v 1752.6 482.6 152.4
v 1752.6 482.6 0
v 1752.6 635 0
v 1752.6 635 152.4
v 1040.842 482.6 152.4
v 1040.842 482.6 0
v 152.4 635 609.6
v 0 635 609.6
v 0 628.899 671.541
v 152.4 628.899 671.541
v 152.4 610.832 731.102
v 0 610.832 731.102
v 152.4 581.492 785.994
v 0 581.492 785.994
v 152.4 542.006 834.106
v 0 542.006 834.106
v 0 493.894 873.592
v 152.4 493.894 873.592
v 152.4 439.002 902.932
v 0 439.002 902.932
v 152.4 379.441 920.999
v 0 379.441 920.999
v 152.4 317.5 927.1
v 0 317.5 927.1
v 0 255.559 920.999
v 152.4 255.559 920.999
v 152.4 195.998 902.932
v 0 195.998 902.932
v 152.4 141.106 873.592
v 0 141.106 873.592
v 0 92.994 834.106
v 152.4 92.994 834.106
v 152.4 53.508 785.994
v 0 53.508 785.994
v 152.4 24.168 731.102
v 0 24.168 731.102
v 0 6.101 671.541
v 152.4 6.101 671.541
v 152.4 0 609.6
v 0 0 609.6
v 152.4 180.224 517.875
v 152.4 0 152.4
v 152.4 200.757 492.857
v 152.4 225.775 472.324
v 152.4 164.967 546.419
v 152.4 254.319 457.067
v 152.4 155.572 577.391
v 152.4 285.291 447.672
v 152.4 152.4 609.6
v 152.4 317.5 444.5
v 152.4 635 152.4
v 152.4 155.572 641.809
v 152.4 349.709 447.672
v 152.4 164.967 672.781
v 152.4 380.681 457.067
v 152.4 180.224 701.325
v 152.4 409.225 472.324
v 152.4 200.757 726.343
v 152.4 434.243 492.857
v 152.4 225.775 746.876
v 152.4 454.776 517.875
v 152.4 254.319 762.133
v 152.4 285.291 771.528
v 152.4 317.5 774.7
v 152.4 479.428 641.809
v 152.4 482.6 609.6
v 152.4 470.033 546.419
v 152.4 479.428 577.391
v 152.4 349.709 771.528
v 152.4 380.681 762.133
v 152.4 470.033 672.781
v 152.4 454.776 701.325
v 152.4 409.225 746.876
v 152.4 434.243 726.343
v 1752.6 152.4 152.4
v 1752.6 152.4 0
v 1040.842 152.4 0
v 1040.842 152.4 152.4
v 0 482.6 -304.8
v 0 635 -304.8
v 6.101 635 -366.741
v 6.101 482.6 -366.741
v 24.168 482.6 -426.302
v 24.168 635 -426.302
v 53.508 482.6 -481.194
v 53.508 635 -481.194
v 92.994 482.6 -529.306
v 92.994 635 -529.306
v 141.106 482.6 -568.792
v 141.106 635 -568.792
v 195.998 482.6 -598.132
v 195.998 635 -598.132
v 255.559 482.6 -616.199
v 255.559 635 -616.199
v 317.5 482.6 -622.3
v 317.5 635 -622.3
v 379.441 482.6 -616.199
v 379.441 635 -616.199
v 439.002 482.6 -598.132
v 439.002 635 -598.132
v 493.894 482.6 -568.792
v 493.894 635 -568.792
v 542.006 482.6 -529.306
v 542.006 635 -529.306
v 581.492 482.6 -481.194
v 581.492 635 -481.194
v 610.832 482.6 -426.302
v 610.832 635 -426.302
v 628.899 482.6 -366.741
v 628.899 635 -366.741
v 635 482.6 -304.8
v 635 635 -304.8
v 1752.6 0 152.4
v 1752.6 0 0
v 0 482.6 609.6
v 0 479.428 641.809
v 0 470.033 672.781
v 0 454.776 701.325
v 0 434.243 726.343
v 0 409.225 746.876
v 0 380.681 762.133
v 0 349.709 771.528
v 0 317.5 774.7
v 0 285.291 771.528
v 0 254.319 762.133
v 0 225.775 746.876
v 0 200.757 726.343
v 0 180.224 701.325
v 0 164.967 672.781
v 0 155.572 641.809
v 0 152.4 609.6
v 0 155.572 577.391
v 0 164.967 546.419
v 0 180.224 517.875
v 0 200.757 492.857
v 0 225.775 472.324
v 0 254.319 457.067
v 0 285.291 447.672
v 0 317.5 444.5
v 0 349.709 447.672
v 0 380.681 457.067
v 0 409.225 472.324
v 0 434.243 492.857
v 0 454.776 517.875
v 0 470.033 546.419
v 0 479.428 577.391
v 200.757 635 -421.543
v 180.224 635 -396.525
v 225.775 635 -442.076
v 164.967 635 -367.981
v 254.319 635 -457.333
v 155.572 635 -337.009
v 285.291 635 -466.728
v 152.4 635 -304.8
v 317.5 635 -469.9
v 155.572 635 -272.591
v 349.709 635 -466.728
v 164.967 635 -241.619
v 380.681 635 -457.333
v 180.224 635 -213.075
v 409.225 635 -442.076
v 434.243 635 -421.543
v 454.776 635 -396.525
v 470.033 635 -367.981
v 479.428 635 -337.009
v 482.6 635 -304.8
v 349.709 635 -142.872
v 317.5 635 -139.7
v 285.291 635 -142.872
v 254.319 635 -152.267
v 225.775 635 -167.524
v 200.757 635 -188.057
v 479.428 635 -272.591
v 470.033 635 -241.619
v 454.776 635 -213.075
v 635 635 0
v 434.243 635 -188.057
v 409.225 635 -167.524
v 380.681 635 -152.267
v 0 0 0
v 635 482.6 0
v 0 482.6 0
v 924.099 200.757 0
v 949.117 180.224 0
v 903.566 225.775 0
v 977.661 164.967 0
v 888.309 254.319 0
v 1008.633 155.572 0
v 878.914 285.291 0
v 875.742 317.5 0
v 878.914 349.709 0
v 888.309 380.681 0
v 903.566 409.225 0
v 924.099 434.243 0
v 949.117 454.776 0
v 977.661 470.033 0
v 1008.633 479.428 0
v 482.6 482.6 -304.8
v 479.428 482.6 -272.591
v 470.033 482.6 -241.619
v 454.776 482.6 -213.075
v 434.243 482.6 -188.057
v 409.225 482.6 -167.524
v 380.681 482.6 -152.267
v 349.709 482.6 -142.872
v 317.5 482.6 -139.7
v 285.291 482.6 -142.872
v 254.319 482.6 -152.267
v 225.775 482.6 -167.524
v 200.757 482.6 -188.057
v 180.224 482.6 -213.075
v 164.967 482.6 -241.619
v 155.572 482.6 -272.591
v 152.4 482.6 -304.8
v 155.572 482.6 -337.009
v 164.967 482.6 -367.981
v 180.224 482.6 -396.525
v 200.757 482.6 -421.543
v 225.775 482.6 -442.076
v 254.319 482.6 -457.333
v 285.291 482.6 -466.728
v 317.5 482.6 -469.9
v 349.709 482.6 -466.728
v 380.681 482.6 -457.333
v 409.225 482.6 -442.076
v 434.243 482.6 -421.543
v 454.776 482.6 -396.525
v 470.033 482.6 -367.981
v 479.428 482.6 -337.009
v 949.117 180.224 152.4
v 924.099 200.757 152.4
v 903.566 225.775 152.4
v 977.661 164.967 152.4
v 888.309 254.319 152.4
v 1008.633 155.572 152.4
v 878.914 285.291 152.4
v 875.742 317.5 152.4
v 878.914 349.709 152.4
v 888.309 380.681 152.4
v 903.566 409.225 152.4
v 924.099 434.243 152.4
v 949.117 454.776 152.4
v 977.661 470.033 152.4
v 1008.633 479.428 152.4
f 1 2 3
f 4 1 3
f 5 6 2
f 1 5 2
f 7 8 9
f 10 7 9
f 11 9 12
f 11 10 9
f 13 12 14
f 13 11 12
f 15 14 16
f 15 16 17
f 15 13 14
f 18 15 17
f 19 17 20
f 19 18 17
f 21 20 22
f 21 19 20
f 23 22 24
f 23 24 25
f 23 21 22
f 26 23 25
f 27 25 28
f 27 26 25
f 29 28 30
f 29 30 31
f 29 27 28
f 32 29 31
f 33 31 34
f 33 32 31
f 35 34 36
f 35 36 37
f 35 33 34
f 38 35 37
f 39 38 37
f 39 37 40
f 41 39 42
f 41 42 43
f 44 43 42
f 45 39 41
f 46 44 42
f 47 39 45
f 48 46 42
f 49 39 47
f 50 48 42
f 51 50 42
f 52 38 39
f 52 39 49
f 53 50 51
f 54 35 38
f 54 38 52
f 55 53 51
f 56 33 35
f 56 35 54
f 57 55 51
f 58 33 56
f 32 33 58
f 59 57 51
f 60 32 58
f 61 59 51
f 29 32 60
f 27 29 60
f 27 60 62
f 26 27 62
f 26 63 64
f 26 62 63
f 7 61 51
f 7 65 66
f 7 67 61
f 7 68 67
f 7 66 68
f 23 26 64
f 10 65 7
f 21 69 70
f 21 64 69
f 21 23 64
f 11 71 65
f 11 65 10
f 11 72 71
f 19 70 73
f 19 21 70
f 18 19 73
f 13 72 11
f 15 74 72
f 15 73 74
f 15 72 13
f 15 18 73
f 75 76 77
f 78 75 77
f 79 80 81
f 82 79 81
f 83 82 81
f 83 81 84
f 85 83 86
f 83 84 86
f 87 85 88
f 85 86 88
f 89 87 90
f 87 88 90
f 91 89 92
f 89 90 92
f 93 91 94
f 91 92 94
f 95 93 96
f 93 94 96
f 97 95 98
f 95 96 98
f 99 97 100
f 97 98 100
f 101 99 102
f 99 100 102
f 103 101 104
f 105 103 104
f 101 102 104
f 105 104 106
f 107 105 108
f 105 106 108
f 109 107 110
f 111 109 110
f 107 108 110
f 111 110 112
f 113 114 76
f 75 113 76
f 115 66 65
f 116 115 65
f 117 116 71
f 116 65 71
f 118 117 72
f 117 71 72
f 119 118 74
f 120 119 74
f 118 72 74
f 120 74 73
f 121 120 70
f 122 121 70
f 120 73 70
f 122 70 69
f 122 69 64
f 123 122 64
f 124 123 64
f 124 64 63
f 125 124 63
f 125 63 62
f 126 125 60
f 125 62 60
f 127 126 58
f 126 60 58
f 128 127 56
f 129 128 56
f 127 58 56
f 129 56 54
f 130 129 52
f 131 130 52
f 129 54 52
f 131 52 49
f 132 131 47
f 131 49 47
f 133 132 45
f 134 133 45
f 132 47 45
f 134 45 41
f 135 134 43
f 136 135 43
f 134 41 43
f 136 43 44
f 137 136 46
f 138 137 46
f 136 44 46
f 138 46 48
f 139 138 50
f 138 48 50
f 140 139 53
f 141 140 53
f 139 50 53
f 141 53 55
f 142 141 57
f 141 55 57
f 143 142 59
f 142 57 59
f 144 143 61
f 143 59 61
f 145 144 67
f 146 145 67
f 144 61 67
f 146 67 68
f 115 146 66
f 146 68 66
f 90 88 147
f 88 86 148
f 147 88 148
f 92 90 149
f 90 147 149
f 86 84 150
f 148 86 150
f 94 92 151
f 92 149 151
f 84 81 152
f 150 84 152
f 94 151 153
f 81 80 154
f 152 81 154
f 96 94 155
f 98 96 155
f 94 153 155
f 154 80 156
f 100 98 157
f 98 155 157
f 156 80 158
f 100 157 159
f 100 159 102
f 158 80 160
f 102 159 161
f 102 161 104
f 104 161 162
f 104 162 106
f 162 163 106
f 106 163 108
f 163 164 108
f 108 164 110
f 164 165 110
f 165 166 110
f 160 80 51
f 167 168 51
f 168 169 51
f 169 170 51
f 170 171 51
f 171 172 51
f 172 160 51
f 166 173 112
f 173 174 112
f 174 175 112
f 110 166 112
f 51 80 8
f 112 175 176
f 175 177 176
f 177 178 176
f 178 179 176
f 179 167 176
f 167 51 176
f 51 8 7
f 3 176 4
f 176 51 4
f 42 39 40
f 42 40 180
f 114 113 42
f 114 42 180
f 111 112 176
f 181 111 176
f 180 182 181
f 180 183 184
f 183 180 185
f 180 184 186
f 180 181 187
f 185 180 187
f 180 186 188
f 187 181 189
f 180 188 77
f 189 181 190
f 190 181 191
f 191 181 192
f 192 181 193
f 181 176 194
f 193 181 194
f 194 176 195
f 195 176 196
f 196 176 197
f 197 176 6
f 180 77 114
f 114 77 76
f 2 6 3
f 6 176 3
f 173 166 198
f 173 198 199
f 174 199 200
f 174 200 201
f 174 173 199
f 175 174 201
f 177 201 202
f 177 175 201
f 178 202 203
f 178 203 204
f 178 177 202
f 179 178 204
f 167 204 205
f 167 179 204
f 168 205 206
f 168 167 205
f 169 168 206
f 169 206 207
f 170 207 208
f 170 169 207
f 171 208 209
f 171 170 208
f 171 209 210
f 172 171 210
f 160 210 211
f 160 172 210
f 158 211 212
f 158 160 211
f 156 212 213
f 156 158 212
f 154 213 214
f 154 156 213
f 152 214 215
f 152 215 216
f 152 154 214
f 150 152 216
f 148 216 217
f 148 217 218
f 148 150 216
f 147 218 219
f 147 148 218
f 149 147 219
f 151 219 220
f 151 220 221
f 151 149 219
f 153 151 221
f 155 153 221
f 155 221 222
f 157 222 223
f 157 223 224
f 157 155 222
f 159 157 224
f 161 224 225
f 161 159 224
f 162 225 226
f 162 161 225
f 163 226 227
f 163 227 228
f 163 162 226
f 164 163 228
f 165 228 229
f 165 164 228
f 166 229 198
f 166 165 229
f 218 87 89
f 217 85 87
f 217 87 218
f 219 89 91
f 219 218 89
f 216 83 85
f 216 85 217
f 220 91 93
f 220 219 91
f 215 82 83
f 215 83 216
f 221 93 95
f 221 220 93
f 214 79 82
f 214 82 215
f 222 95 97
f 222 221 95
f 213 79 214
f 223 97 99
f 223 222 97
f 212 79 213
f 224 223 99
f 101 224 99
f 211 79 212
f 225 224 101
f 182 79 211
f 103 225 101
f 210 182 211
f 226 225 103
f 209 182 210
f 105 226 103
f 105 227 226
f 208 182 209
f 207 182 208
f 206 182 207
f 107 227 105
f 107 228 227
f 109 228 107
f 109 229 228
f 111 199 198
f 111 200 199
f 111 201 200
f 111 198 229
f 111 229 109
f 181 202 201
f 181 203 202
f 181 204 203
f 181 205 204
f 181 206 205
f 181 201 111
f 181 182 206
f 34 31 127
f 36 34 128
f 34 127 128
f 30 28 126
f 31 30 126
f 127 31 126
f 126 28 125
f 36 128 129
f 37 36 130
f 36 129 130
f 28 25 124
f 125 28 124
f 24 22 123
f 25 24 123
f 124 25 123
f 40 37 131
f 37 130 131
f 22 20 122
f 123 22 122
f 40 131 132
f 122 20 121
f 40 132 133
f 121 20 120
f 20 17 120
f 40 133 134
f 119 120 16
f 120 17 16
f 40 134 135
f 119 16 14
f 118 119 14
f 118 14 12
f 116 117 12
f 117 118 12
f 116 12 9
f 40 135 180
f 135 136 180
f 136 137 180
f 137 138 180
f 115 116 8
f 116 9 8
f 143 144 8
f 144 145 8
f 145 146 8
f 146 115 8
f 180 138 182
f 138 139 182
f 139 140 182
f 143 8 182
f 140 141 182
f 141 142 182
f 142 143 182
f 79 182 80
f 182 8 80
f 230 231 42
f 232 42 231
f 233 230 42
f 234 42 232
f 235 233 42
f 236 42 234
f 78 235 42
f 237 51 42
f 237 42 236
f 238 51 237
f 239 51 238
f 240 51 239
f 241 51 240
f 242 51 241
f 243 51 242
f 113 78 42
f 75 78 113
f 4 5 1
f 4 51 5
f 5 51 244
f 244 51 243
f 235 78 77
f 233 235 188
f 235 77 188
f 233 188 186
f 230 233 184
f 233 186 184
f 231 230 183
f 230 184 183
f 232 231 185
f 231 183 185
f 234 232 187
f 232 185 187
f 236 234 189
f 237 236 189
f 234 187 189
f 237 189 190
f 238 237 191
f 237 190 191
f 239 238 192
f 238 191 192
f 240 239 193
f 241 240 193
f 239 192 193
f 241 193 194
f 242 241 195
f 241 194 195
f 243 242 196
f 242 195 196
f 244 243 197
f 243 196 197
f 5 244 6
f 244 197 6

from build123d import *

# Parameters (mm, degrees)
F1_DEPTH = 152.4
F3_R     = 165.1
F4_DEPTH = 152.4
F6_R     = 165.1
F7_DEPTH = 152.4


with BuildPart() as f1:
    # F0 (on Top) → F1 (new body)
    with BuildSketch(Plane.XY):
        with BuildLine():
            Line((0, 635), (0, 0))
            Line((0, 0), (1752.6, 0))
            Line((1752.6, 0), (1752.6, 152.4))
            Line((1752.6, 152.4), (1040.841937, 152.4))
            ThreePointArc((1040.841937, 152.4), (875.741937, 317.5), (1040.841937, 482.6))
            Line((1040.841937, 482.6), (1752.6, 482.6))
            Line((1752.6, 482.6), (1752.6, 635))
            Line((1752.6, 635), (0, 635))
        make_face()
    extrude(amount=F1_DEPTH)

    # F3 (on offset) → F4 (join)
    with BuildSketch(Plane.YZ.offset(152.4)):
        with BuildLine():
            Line((0, 609.6), (0, 152.4))
            Line((0, 152.4), (635, 152.4))
            Line((635, 152.4), (635, 609.6))
            ThreePointArc((635, 609.6), (317.5, 927.1), (0, 609.6))
        make_face()
        with Locations((317.5, 609.6)):
            Circle(F3_R, mode=Mode.SUBTRACT)
    extrude(amount=-F4_DEPTH)

    # F6 (on offset) → F7 (join)
    with BuildSketch(Plane.XZ.offset(-635)):
        with BuildLine():
            Line((635, 0), (0, 0))
            Line((0, 0), (0, -304.8))
            ThreePointArc((0, -304.8), (317.5, -622.3), (635, -304.8))
            Line((635, -304.8), (635, 0))
        make_face()
        with Locations((317.5, -304.8)):
            Circle(F6_R, mode=Mode.SUBTRACT)
    extrude(amount=F7_DEPTH)


solid = f1.part
